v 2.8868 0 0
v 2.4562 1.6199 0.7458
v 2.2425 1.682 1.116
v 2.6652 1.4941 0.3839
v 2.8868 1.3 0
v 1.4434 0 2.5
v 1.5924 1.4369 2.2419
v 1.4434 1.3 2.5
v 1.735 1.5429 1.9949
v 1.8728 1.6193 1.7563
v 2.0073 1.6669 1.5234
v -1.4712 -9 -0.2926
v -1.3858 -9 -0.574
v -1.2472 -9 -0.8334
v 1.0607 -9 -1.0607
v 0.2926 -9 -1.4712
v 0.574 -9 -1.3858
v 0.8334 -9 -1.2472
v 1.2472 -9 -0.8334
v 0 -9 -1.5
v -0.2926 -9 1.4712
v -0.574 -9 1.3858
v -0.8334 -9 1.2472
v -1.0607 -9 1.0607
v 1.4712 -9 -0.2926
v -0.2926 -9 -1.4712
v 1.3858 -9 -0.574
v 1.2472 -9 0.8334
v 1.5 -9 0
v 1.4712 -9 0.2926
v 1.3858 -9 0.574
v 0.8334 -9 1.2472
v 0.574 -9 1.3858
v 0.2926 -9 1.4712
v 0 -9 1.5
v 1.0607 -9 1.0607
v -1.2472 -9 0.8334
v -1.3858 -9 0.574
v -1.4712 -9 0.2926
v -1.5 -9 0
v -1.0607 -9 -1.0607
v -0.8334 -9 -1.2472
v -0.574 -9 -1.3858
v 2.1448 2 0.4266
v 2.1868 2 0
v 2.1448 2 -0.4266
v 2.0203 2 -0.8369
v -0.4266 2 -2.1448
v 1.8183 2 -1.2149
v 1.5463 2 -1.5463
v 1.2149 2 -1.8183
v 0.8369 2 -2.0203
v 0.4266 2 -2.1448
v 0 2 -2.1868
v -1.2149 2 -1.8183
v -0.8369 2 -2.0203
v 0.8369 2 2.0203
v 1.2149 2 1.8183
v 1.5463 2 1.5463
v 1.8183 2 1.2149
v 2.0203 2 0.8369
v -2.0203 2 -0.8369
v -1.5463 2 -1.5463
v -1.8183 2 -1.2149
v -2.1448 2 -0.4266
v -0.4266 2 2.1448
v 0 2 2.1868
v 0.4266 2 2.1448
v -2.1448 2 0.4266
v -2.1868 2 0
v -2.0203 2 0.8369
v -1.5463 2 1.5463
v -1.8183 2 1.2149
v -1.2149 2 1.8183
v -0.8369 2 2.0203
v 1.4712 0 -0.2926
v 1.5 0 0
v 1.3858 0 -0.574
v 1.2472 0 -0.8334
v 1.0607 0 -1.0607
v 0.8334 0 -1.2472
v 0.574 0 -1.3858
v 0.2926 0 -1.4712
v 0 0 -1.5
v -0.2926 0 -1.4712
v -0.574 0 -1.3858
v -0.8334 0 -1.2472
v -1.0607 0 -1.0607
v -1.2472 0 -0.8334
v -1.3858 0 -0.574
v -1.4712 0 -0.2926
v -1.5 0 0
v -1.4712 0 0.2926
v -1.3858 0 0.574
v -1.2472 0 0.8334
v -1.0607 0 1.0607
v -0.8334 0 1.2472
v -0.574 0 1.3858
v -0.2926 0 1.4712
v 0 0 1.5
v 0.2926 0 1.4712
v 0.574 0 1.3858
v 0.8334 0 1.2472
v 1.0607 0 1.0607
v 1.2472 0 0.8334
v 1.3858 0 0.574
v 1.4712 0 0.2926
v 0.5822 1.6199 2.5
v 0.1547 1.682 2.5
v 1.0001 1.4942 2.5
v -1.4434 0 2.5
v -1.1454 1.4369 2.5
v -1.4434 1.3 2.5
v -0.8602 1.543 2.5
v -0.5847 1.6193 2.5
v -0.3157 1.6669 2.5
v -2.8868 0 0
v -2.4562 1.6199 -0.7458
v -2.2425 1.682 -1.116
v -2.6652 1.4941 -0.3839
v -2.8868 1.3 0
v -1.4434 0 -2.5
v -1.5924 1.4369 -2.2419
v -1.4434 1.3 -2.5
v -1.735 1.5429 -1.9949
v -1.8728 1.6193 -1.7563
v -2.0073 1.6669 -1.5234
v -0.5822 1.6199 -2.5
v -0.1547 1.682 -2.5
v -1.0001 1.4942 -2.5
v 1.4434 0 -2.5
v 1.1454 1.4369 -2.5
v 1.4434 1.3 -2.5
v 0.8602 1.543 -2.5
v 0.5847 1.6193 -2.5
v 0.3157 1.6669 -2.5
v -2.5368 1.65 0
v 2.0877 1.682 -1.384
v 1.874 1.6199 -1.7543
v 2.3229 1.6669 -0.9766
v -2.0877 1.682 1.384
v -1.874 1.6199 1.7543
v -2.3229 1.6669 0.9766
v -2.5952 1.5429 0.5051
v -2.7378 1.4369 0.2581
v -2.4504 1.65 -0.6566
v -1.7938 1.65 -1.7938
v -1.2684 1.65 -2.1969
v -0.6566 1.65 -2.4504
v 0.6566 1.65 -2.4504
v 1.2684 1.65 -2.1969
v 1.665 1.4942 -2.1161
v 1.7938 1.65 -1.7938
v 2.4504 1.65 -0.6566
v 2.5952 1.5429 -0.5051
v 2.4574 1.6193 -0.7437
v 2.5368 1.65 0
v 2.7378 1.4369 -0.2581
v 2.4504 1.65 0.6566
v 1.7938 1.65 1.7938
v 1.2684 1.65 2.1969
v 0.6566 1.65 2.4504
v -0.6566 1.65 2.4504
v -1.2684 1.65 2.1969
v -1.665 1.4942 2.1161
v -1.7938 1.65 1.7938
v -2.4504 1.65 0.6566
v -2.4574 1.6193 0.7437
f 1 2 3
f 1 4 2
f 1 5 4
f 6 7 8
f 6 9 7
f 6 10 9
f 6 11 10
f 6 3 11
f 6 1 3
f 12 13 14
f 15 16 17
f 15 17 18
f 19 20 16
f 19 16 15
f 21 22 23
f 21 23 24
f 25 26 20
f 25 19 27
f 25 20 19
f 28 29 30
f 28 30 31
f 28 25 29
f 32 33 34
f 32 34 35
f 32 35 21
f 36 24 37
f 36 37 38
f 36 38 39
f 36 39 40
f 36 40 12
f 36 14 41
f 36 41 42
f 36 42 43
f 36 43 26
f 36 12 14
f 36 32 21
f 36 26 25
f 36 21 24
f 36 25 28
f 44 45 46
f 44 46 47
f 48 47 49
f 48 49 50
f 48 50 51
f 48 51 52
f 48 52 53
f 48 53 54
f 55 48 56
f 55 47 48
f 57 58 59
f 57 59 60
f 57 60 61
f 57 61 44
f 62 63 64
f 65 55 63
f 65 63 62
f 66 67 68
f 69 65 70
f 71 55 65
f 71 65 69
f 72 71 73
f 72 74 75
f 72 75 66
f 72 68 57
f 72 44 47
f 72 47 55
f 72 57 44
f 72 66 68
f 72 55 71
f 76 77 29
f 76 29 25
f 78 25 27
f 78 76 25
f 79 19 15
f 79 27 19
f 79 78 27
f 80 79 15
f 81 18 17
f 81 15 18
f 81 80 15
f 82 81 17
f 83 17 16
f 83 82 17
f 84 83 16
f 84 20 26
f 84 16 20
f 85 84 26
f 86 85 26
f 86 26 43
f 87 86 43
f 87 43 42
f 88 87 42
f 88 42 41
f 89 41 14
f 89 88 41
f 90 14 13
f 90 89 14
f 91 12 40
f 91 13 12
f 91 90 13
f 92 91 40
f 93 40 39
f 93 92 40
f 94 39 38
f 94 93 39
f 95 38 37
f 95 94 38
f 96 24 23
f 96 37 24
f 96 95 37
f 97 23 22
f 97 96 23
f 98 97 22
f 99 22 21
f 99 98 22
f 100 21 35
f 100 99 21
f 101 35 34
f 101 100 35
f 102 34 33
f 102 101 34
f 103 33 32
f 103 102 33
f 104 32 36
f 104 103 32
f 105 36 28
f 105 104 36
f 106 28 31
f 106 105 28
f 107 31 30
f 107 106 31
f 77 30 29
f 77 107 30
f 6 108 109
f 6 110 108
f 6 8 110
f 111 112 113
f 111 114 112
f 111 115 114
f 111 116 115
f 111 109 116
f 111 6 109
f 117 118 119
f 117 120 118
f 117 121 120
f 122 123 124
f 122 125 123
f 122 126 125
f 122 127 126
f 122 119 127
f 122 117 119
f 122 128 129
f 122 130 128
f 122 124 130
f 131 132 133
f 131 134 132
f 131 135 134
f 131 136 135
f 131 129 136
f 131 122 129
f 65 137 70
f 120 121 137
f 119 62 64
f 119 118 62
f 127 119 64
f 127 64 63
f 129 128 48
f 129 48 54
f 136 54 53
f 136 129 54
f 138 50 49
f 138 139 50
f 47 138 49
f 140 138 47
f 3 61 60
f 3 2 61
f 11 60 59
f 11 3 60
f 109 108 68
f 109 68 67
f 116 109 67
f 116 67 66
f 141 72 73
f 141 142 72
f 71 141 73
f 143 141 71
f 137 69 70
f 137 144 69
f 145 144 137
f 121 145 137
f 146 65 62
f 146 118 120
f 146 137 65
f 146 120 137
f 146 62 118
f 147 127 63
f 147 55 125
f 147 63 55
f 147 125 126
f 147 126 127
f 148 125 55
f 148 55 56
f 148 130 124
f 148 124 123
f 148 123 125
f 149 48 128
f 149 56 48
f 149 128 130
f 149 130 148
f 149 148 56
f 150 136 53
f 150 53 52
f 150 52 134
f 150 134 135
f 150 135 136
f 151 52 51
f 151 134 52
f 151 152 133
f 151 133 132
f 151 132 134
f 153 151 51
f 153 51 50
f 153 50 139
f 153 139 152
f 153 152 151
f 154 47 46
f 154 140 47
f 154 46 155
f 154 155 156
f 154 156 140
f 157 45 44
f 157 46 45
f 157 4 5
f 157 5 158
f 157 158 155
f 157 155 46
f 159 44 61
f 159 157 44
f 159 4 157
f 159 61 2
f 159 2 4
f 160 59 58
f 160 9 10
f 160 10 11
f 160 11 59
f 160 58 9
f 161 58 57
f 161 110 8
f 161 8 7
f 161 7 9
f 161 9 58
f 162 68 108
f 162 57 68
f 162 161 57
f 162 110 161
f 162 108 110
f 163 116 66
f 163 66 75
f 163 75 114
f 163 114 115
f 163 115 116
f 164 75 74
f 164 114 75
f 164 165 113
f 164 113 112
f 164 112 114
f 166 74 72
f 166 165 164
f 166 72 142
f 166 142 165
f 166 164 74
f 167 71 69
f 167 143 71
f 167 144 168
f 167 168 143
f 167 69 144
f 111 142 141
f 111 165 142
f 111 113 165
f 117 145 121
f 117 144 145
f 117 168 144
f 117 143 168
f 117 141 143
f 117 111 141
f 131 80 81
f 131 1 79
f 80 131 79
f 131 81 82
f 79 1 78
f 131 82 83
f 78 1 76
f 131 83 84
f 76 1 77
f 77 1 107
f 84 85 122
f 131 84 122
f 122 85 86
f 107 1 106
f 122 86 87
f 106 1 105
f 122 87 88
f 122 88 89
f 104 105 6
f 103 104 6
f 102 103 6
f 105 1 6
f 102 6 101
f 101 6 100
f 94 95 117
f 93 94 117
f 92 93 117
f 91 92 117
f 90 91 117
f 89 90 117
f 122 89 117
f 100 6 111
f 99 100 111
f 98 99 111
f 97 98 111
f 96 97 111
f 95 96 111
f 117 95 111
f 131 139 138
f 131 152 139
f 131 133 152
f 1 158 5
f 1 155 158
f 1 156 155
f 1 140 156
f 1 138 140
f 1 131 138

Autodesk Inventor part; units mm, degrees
ref_plane "YZ Plane" through (0, 0, 0) normal (1, 0, 0) x (0, 1, 0)
ref_plane "XZ Plane" through (0, 0, 0) normal (0, 1, 0) x (-1, 0, 0)
ref_plane "XY Plane" through (0, 0, 0) normal (0, 0, 1) x (1, 0, 0)
sketch "Boceto1" plane through (0, 0, 0) normal (0, 1, 0) x (-1, 0, 0)
  point P0 (0, 0)
sketch "Boceto2" plane through (0, 0, 0) normal (0, 1, 0) x (-1, 0, 0)
  line L0 (1.4434, -2.5) -> (-1.4434, -2.5)
  line L1 (-1.4434, -2.5) -> (-2.8868, 0)
  line L2 (-2.8868, 0) -> (-1.4434, 2.5)
  line L3 (-1.4434, 2.5) -> (1.4434, 2.5)
  line L4 (1.4434, 2.5) -> (2.8868, 0)
  line L5 (2.8868, 0) -> (1.4434, -2.5)
  point P0 (0, 0)
  point P1 (0, 0)
  dimension "d0" = 5
extrude "Extrusión1" add sketch "Boceto2" along normal blind 2
sketch "Boceto3" plane through (0, 0, 0) normal (0, -1, 0) x (1, 0, 0)
  circle A0 centre (0, 0) radius 1.5
  dimension "d3" = 3
extrude "Extrusión2" add sketch "Boceto3" along normal blind 9
sketch "Boceto4" plane through (0, 0, 0) normal (0, 0, 1) x (1, 0, 0)
  line L0 (-2.8868, 0) -> (-2.8868, 2) projected
  line L1 (-2.8868, 1.3) -> (-2.8868, 2)
  line L2 (-2.8868, 2) -> (-2.1868, 2)
  line L3 (-2.8868, 2) -> (-1.4434, 2) projected
  line L4 (-2.8868, 1.3) -> (-2.1868, 2)
  line L5 (0, -11.2) -> (0, 4.2) projected
  point P0 (0, 0)
  dimension "d6" = 0.7
  dimension "d7" = 0.7
revolve "Revolución1" cut sketch "Boceto4" angle 360 about axis through (0, -10, 0) along (0, 1, 0)
thread "Rosca1" size "M3x0.5" class "6g" standard "ISO Metric profile" full length
properties part number "Tornillo" material "Acero inoxidable"
